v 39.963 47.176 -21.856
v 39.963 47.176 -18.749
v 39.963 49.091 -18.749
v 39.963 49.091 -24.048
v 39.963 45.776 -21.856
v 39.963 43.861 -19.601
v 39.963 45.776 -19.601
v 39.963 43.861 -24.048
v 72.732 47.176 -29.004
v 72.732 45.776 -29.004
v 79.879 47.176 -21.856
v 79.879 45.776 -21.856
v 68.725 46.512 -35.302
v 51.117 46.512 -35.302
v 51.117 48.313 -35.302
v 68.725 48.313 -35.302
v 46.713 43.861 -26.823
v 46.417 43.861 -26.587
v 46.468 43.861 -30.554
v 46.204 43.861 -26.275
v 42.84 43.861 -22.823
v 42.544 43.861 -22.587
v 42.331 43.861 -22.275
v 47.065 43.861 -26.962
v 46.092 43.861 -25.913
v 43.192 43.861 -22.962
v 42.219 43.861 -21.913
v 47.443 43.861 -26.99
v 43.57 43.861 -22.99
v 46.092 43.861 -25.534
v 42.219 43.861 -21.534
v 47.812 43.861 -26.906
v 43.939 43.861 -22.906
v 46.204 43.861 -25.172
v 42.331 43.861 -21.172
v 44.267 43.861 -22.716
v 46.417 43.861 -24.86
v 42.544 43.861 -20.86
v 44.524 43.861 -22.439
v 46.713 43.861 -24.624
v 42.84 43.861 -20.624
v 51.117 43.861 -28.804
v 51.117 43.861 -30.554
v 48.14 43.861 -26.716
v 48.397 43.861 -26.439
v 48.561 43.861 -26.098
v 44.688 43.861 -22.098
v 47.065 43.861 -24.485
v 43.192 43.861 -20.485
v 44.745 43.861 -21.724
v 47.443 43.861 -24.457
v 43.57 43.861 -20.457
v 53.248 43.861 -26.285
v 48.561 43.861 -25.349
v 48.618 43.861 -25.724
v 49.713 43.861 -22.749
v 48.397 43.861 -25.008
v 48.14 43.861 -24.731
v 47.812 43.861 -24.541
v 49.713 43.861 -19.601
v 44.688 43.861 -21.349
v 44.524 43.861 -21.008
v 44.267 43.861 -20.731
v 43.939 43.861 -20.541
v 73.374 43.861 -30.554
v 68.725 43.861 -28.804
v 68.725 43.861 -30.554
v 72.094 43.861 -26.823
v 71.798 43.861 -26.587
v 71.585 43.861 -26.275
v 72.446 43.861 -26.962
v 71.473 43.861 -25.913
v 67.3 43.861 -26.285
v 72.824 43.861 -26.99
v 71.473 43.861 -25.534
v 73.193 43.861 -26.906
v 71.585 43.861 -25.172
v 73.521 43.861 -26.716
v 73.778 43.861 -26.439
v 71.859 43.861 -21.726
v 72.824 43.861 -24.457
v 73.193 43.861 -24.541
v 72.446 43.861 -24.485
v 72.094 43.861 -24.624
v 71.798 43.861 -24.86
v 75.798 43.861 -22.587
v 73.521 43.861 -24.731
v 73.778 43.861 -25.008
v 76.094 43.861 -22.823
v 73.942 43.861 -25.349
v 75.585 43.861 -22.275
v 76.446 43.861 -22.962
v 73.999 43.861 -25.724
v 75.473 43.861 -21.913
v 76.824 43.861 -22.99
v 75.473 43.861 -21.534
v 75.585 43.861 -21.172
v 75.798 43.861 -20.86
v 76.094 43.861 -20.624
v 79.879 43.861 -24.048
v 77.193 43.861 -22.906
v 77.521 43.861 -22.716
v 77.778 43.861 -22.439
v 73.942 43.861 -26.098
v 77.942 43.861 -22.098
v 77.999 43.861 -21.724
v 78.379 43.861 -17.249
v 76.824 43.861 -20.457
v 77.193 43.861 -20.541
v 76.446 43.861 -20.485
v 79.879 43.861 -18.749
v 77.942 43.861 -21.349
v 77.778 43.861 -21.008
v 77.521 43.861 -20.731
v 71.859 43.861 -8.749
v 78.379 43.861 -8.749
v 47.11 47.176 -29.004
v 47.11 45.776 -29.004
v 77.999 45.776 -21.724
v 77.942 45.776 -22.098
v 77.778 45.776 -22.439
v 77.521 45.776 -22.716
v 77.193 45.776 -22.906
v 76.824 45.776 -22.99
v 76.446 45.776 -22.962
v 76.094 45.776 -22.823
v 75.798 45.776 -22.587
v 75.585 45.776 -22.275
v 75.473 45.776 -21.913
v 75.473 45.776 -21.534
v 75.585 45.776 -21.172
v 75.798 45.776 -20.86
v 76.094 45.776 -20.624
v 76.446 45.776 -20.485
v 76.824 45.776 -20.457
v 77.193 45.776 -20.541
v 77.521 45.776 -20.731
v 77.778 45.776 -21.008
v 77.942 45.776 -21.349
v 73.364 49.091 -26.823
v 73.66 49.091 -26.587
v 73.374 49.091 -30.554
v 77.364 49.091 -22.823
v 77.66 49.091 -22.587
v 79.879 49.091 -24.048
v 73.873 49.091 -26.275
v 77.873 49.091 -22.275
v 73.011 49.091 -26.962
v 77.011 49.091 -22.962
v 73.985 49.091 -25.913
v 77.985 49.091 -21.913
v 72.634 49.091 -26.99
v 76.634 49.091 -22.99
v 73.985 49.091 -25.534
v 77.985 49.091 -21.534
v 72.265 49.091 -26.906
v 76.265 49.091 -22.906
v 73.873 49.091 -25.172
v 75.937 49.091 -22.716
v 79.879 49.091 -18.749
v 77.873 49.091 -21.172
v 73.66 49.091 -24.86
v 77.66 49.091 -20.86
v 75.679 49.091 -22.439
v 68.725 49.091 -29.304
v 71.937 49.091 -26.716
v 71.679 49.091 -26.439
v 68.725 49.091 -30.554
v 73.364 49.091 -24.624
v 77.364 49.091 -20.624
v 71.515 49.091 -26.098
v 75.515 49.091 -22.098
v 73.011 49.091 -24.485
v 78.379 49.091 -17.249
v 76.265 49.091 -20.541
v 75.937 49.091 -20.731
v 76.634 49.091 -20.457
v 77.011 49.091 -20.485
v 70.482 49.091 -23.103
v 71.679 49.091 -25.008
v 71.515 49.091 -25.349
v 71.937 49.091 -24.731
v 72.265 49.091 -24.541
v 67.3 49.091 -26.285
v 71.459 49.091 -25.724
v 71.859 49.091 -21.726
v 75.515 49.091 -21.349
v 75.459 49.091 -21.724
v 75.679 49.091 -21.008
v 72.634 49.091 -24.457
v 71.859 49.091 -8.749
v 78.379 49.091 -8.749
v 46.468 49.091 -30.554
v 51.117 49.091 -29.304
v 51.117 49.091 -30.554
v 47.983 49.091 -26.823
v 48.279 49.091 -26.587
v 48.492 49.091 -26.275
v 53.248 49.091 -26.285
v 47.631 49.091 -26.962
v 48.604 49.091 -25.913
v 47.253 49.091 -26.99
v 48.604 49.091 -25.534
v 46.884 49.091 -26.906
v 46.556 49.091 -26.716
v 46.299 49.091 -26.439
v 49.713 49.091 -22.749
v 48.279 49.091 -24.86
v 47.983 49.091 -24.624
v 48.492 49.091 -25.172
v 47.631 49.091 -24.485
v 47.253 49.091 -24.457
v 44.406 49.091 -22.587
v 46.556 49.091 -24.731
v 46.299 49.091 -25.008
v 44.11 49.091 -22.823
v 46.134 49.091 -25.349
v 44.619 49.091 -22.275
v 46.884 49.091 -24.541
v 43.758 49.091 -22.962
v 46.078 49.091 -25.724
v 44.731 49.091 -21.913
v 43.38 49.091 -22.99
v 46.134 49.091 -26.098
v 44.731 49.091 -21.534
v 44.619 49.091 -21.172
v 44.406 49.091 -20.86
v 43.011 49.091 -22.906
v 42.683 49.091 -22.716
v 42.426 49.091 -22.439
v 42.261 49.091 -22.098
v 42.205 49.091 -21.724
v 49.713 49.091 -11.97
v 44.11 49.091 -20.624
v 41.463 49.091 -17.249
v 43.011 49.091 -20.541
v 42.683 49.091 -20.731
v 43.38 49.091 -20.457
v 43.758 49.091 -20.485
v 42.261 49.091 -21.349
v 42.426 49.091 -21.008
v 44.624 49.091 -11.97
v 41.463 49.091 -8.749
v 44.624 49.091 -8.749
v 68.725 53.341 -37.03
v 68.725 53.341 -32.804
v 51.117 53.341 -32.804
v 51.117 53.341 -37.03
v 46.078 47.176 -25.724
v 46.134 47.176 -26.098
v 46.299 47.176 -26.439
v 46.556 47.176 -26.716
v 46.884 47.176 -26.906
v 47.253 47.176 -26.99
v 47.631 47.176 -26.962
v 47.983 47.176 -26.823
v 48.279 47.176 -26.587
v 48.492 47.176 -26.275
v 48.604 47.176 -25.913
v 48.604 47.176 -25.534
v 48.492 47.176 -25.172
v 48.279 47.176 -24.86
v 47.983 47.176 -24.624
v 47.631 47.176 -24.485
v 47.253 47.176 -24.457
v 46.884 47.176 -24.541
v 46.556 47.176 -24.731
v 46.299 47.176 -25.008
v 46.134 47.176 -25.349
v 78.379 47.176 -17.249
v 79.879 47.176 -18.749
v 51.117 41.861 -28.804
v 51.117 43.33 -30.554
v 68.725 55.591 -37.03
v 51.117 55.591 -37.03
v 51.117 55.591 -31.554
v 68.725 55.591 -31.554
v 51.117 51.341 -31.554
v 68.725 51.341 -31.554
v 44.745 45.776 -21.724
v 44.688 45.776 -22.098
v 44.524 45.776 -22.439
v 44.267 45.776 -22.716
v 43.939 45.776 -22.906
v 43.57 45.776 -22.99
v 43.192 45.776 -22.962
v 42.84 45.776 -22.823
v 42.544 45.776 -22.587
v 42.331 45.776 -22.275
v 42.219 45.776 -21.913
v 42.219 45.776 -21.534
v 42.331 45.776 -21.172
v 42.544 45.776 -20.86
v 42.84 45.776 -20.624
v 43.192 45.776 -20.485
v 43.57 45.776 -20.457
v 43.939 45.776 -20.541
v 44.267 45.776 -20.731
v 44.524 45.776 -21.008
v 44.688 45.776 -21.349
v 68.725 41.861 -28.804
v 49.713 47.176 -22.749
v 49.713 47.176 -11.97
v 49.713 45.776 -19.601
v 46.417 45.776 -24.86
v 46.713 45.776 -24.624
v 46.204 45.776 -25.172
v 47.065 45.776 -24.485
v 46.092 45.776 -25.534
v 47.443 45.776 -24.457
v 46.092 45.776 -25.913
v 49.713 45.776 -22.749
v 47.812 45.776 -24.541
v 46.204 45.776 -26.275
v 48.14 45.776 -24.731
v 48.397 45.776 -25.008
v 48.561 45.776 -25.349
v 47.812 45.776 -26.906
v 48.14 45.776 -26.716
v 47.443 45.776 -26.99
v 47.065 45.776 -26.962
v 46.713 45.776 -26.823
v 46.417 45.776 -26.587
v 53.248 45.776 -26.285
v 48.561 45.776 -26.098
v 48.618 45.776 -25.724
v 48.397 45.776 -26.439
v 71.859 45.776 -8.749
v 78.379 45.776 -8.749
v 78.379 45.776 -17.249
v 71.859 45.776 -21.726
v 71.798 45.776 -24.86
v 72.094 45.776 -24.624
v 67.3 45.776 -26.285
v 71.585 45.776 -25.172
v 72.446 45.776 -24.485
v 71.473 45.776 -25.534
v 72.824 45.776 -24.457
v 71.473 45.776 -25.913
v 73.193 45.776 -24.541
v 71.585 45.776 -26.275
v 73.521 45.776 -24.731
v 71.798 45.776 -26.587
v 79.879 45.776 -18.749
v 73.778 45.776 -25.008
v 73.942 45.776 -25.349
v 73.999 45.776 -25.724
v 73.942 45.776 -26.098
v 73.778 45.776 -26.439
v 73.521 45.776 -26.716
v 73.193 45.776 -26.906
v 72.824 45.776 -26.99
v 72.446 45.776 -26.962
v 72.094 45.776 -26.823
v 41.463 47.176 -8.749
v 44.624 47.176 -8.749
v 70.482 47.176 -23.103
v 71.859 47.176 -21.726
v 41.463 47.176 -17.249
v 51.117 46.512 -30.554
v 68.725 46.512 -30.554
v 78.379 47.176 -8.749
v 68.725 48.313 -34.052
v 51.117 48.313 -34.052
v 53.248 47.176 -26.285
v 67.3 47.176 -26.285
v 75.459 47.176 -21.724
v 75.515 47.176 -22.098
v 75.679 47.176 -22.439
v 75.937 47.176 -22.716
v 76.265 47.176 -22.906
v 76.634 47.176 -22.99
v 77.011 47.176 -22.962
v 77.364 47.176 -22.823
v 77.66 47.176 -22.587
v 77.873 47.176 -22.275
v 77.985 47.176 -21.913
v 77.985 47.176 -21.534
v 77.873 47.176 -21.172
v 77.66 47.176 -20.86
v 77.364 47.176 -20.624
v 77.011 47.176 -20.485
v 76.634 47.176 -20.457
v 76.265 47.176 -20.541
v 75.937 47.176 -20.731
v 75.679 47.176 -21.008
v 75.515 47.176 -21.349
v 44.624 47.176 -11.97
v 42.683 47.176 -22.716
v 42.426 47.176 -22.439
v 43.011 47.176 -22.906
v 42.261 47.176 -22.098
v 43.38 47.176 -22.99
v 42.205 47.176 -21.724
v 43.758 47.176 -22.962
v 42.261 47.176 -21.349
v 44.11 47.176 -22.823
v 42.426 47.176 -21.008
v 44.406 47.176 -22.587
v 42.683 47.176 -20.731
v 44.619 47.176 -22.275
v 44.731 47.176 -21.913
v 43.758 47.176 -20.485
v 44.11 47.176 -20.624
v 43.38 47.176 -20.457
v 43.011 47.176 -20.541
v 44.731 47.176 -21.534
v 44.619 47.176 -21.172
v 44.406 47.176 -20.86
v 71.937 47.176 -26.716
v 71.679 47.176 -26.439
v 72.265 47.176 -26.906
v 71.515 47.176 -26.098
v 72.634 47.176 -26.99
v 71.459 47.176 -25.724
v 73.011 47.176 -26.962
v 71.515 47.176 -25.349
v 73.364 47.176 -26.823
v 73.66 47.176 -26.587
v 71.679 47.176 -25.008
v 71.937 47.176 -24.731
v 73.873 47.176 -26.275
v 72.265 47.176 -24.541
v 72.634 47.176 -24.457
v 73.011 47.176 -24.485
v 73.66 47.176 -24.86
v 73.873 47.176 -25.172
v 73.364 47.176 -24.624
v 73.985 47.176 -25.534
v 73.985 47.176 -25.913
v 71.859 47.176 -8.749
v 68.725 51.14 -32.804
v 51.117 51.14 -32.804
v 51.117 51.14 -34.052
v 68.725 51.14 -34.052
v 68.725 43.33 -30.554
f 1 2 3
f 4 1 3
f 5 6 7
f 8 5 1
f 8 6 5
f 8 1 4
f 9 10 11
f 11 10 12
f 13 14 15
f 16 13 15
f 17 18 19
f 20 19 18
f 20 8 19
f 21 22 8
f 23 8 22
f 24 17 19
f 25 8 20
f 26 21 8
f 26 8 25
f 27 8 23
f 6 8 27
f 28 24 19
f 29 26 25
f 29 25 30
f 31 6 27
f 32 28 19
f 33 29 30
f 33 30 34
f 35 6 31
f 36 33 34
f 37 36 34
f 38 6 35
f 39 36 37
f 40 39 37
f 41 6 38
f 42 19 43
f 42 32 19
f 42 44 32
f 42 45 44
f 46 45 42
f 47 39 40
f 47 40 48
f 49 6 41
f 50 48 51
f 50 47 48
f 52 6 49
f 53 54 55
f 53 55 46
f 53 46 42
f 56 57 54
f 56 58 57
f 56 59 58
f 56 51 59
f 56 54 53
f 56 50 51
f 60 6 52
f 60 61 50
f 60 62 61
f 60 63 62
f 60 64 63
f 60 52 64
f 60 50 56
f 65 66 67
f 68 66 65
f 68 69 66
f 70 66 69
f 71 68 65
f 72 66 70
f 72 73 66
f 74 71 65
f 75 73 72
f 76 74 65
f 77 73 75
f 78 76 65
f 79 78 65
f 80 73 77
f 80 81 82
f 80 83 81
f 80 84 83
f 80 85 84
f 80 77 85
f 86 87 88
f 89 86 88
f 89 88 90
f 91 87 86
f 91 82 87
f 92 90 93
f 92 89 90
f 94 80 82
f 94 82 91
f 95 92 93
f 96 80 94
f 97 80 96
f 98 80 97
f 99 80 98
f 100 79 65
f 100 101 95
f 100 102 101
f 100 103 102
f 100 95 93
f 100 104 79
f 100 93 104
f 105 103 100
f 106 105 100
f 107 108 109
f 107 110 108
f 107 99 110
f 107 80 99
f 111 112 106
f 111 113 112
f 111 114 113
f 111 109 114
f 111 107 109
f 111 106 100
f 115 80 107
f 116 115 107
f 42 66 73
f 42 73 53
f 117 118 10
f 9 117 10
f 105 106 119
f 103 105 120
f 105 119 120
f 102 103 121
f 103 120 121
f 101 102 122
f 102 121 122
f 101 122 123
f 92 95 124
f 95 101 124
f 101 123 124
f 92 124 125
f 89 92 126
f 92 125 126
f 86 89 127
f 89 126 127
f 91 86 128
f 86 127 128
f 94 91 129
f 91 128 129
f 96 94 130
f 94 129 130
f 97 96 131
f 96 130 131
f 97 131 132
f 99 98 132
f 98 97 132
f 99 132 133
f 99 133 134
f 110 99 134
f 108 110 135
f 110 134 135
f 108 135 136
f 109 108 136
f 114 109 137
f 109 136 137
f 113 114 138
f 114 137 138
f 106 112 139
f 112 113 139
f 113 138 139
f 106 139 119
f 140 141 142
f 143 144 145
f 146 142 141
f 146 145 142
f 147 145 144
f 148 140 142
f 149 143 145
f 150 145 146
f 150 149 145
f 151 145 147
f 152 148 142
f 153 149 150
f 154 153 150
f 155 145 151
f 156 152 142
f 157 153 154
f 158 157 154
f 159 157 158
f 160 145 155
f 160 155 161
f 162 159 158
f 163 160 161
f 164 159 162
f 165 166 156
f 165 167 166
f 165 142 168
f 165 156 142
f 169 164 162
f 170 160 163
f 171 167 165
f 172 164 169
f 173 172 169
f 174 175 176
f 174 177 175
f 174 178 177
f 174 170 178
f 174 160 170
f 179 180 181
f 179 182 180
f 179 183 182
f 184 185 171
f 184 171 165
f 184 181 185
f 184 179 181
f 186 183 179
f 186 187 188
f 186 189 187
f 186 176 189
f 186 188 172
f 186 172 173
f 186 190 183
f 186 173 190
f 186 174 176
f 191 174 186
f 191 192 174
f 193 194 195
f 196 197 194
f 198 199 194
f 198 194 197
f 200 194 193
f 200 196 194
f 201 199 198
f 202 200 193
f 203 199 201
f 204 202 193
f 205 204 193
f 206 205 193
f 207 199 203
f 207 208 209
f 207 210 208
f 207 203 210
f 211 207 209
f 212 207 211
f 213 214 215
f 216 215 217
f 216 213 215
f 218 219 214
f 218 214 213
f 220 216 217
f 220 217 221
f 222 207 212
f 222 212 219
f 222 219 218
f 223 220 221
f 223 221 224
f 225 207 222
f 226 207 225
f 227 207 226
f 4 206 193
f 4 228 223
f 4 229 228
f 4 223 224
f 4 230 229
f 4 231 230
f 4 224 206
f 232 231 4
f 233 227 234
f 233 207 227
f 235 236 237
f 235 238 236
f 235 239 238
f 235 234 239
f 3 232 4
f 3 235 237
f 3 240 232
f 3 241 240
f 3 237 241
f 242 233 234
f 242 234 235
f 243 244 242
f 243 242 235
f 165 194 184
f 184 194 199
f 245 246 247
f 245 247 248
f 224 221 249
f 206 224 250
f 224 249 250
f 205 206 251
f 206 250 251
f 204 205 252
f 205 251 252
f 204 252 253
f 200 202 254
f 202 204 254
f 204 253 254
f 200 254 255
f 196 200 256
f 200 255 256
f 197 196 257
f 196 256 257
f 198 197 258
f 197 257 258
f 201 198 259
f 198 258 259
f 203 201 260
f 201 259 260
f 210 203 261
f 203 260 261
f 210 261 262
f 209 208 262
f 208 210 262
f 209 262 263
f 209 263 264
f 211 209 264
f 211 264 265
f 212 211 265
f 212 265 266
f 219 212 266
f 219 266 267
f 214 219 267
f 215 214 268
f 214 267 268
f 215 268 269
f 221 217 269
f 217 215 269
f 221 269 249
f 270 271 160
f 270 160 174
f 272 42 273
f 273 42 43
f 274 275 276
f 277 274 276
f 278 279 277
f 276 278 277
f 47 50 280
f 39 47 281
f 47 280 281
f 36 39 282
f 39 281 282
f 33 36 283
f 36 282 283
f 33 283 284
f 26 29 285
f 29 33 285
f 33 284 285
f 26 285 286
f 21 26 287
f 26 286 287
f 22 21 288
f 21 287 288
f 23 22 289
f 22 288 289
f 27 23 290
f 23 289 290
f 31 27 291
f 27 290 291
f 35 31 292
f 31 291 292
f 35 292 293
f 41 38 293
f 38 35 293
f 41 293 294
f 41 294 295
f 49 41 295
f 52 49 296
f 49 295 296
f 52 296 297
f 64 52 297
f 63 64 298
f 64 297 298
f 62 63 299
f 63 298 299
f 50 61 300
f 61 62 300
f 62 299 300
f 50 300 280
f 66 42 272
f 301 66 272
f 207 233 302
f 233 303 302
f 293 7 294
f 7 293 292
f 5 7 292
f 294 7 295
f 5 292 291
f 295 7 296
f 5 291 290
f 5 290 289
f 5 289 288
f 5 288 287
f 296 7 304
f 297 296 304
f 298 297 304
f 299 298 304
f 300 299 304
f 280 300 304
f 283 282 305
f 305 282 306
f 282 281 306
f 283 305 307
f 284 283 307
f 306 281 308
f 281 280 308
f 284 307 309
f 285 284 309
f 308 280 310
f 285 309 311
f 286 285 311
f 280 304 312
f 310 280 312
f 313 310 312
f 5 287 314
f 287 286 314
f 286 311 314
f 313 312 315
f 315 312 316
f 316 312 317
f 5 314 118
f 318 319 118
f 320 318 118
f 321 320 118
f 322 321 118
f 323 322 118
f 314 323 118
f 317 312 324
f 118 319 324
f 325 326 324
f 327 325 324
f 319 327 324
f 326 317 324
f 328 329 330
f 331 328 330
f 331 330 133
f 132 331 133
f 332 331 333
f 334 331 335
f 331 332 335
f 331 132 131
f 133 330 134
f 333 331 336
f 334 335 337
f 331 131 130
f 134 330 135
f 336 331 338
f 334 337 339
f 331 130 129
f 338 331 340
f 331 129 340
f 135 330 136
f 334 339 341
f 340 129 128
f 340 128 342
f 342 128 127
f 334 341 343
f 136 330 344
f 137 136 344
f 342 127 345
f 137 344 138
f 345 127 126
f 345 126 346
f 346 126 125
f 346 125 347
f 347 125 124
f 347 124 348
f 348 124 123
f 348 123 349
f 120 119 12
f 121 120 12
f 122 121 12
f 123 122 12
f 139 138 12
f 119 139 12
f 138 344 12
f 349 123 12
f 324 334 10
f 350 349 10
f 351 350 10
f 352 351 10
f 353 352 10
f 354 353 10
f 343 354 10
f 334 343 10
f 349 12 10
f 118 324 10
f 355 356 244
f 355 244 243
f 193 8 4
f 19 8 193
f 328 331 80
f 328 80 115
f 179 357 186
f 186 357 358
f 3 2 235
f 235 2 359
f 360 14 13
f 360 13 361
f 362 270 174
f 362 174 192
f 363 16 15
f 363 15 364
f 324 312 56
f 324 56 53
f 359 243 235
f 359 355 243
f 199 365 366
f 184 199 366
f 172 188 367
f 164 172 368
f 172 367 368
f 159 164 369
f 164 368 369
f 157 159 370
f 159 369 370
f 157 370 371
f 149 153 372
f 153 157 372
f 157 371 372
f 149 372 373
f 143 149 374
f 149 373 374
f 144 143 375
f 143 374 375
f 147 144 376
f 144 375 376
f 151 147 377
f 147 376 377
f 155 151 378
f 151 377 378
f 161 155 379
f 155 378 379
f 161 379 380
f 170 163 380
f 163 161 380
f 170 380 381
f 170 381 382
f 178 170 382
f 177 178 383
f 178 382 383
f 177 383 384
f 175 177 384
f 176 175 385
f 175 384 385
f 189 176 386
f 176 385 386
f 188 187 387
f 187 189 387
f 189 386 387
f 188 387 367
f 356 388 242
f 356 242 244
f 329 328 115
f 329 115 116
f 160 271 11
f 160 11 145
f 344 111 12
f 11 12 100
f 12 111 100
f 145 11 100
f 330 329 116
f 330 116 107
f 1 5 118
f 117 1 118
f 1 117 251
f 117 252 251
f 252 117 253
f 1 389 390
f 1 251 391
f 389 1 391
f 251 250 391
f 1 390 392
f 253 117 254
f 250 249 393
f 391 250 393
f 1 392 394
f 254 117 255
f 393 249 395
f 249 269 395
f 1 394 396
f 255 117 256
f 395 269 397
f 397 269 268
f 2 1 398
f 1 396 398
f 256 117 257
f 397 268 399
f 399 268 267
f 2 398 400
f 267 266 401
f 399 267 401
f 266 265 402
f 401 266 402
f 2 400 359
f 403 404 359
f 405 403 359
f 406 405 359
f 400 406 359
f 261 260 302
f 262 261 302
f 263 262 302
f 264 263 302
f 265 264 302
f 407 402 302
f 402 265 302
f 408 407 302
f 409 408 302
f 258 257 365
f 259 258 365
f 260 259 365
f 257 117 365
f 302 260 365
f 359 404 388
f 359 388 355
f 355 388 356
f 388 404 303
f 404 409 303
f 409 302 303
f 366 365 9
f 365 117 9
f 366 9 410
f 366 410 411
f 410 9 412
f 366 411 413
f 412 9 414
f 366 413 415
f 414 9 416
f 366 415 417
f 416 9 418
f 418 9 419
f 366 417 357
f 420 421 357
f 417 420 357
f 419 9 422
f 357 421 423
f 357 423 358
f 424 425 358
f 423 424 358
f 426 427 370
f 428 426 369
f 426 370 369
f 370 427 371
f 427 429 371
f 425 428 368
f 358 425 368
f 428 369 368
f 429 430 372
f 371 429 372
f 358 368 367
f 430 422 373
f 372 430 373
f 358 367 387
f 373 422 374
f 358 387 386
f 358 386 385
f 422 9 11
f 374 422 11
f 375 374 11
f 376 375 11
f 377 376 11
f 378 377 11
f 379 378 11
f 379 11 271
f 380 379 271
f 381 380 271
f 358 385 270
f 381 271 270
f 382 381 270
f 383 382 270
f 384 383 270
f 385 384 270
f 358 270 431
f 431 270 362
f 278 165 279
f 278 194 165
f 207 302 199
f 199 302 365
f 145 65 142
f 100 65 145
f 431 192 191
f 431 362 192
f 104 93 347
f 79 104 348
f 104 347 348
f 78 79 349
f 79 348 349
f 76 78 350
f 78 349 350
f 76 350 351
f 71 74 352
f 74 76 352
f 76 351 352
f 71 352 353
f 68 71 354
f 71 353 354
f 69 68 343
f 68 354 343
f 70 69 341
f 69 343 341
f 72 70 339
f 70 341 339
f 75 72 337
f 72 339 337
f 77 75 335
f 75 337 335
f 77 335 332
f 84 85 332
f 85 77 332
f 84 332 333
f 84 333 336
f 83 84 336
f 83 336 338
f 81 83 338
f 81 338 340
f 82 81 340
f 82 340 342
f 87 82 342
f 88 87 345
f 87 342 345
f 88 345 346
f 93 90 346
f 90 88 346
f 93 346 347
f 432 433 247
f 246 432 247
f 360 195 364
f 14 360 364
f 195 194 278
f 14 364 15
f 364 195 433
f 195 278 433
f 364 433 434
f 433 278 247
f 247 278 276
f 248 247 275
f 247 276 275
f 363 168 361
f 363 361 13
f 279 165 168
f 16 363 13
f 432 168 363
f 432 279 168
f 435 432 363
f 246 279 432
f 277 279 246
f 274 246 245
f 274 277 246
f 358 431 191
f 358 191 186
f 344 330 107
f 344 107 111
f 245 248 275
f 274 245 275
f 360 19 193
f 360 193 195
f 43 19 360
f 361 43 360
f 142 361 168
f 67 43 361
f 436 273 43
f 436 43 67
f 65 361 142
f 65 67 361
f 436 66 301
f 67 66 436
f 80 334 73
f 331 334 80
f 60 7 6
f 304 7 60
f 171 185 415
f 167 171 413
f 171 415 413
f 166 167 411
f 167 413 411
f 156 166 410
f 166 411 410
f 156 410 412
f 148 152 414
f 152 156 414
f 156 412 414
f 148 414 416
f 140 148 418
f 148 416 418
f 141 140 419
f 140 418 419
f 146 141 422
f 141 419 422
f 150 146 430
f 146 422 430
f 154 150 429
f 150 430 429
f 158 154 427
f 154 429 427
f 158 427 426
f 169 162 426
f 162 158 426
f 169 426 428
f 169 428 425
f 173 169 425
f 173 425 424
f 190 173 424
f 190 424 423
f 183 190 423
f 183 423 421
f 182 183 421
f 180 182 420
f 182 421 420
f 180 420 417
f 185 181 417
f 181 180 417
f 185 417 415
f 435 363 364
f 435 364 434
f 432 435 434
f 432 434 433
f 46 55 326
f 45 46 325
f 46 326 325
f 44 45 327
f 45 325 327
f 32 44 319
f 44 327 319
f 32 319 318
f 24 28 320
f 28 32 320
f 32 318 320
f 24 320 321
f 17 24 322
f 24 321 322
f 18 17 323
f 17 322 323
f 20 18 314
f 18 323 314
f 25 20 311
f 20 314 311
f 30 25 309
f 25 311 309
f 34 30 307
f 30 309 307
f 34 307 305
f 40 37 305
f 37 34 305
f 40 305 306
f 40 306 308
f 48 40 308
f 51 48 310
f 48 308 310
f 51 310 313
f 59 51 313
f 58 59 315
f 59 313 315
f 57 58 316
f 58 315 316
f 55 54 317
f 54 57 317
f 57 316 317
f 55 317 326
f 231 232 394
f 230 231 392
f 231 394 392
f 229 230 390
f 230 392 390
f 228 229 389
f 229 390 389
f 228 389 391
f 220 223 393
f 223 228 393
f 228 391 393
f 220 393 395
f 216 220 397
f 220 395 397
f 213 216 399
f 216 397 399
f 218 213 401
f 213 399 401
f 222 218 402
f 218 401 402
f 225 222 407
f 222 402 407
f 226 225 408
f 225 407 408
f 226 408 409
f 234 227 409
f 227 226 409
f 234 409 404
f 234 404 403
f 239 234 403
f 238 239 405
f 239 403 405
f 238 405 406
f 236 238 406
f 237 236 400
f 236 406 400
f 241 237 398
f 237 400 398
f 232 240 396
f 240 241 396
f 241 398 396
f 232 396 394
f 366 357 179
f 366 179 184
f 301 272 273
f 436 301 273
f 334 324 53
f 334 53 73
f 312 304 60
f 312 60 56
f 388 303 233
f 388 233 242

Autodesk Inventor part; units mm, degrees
ref_plane "Work Plane1" through (59.9208, 47.0911, 21.911) normal (0, 1, 0) x (-1, 0, 0)
sketch "Sketch1" plane through (59.9208, 47.0911, 21.911) normal (0, 1, 0) x (-1, 0, 0)
  circle A0 centre (-16.808, -43.6345) radius 1.27
  circle A1 centre (12.5729, -47.6345) radius 1.27
  circle A2 centre (16.4459, -43.6345) radius 1.27
  circle A3 centre (-12.808, -47.6345) radius 1.27
  line L0 (10.208, -33.8805) -> (10.208, -44.6601)
  line L1 (10.208, -44.6601) -> (6.6725, -48.1956)
  circle A4 centre (-16.808, -43.6345) radius 1.27 projected
  circle A5 centre (12.5729, -47.6345) radius 1.27 projected
  circle A6 centre (16.4459, -43.6345) radius 1.27 projected
  circle A7 centre (-12.8081, -47.6345) radius 1.27 projected
  line L2 (19.708, -15.6655) -> (-19.708, -15.6655)
  line L3 (0, -15.6655) -> (0, -20.8781)
  line L4 (6.6725, -48.1956) -> (-7.3796, -48.1956)
  line L5 (-19.958, -43.8381) -> (-12.8316, -50.9645)
  line L6 (-12.8316, -50.9645) -> (12.8316, -50.9645)
  line L7 (-19.958, -40.6601) -> (-19.958, -43.8381)
  line L8 (0, -48.1956) -> (0, -46.7038)
  line L9 (19.958, -43.8381) -> (12.8316, -50.9645)
  line L10 (19.958, -40.6601) -> (19.958, -43.8381)
  line L11 (-11.938, -30.6601) -> (-11.938, -43.6372)
  line L12 (-10.5616, -45.0137) -> (-11.938, -43.6372)
  line L13 (-10.5616, -45.0137) -> (-7.3796, -48.1956)
  line L14 (15.2967, -30.6601) -> (18.458, -30.6601)
  line L15 (18.458, -30.6601) -> (18.458, -39.1601)
  line L16 (-18.458, -39.1601) -> (-18.458, -30.6601)
  line L17 (-18.458, -30.6601) -> (-11.938, -30.6601)
  line L18 (10.208, -33.8805) -> (15.2967, -33.8805)
  line L19 (15.2967, -33.8805) -> (15.2967, -30.6601)
  line L20 (-19.958, -40.6601) -> (-18.458, -39.1601)
  line L21 (19.958, -40.6601) -> (18.458, -39.1601)
  point P0 (-19.708, -43.6601)
  point P1 (-6.6725, -48.1956)
  dimension "d14" = 5
  dimension "d15" = 135
  dimension "d18" = 2.54
extrude "Extrusion1" add sketch "Sketch1" along normal blind 2
ref_plane "Work Plane2" through (59.9208, 45.8611, 21.911) normal (0, -1, 0) x (1, 0, 0)
sketch "Sketch2" plane through (59.9208, 45.8611, 21.911) normal (0, -1, 0) x (1, 0, 0)
  line L0 (-10.208, -33.8805) -> (-10.208, -44.6601) projected
  line L1 (-10.208, -44.6601) -> (-6.6725, -48.1956) projected
  line L2 (-6.6725, -48.1956) -> (7.3796, -48.1956) projected
  circle A0 centre (16.808, -43.6345) radius 1.27 projected
  circle A1 centre (-12.5729, -47.6345) radius 1.27 projected
  circle A2 centre (-16.4459, -43.6345) radius 1.27 projected
  circle A3 centre (12.808, -47.6345) radius 1.27 projected
  line L3 (19.958, -40.6601) -> (19.958, -43.8381) projected
  line L4 (19.958, -43.8381) -> (12.8316, -50.9645) projected
  line L5 (12.8316, -50.9645) -> (-12.8316, -50.9645) projected
  line L6 (-12.8316, -50.9645) -> (-19.958, -43.8381) projected
  line L7 (-19.958, -43.8381) -> (-19.958, -40.6601) projected
  line L8 (7.3796, -48.1956) -> (11.938, -43.6372) projected
  line L9 (11.938, -43.6372) -> (11.938, -30.6601) projected
  line L10 (11.938, -30.6601) -> (18.458, -30.6601) projected
  line L11 (18.458, -30.6601) -> (18.458, -39.1601) projected
  line L12 (-18.458, -39.1601) -> (-18.458, -30.6601) projected
  line L13 (-18.458, -30.6601) -> (-15.2967, -30.6601) projected
  line L14 (-15.2967, -30.6601) -> (-15.2967, -33.8805) projected
  line L15 (-15.2967, -33.8805) -> (-10.208, -33.8805) projected
  line L16 (18.458, -39.1601) -> (19.958, -40.6601) projected
  line L17 (-19.958, -40.6601) -> (-18.458, -39.1601) projected
  circle A4 centre (-16.4459, -43.6345) radius 1.27 projected
  line L18 (-19.958, -43.8381) -> (-19.958, -40.6601) projected
  line L19 (-19.958, -41.5123) -> (-10.208, -41.5123)
  line L20 (-10.208, -33.8805) -> (-10.208, -44.6601) projected
  point P0 (-59.9208, -21.911)
extrude "Extrusion2" add sketch "Sketch2" along normal blind 2 contours L0 L1 L2 L8 L9 L10 L11 L16 L3 L4 L5 L6 L7 L19
sketch "Sketch4" plane through (79.8789, 45.8611, -18.7491) normal (1, 0, 0) x (0, 0, -1)
  line L0 (0, 1.23) -> (3.178, 1.23) projected
  line L1 (0, 0) -> (-1.5, 0) projected
  line L2 (0, 1.23) -> (0, 0)
  line L3 (-12.1065, -0.085) -> (12.1065, -0.085)
  line L4 (12.1065, -0.085) -> (12.1065, 1.315)
  line L5 (12.1065, 1.315) -> (-12.1065, 1.315)
  line L6 (-12.1065, 1.315) -> (-12.1065, -0.085)
  line L7 (-12.1065, -0.085) -> (12.1065, 1.315) construction
  line L8 (12.1065, -0.085) -> (-12.1065, 1.315) construction
  point P0 (0, 0.615)
  dimension "d73" = 1.4
extrude "Extrusion3" cut sketch "Sketch4" against normal through all
sketch "Sketch5" plane through (59.9208, 43.8611, 21.911) normal (0, -1, 0) x (1, 0, 0)
  line L0 (-19.708, -43.6601) -> (-19.708, -40.6601)
  line L1 (-12.6424, -50.7145) -> (-19.708, -43.6601)
  line L2 (12.728, -50.7145) -> (-12.6424, -50.7145)
  line L3 (19.708, -43.7345) -> (12.728, -50.7145)
  line L4 (-13.4529, -52.4645) -> (13.4529, -52.4645)
  line L5 (19.708, -43.7345) -> (19.708, -40.6601)
  line L6 (-12.8316, -50.9145) -> (12.8316, -50.9145)
  line L7 (12.8316, -50.9645) -> (11.3316, -52.4645)
  line L8 (-19.958, -43.8381) -> (-12.8316, -50.9645)
  line L9 (-12.8316, -50.9645) -> (-11.3316, -52.4645)
  line L10 (-12.8316, -50.9645) -> (-10.7103, -50.9645) construction
  line L11 (12.8316, -50.9145) -> (12.8816, -50.9145)
  line L12 (-12.8316, -50.9645) -> (12.8316, -50.9645)
  line L13 (12.8316, -50.9645) -> (12.8816, -50.9145)
  line L14 (12.8316, -50.9645) -> (19.958, -43.8381)
  line L15 (-12.8316, -50.9145) -> (-12.8816, -50.9145)
  line L16 (-12.8316, -50.9645) -> (-12.8816, -50.9145)
  line L17 (12.8109, -50.9145) -> (19.958, -43.7673)
  line L18 (-19.958, -43.7673) -> (-12.8109, -50.9145)
  line L19 (-19.958, -45.9594) -> (-13.4529, -52.4645)
  line L20 (13.4529, -52.4645) -> (19.958, -45.9594)
  line L21 (-19.958, -43.7673) -> (-19.958, -45.9594)
  line L22 (12.8316, -50.9645) -> (19.958, -43.8381) projected
  line L23 (19.958, -43.8381) -> (19.958, -45.9594)
  line L24 (19.958, -43.8381) -> (19.958, -43.7673)
  line L25 (19.958, -43.8381) -> (19.958, -40.6601) projected
  dimension "d29" = 0.2
  dimension "d62" = 45
  dimension "d74" = 0.05
  dimension "d75" = 0.05
  dimension "d76" = 1.5
  dimension "d77" = 1.5
extrude "Extrusion4" add sketch "Sketch5" against normal up to surface (5.23 mm away)
ref_plane "Work Plane13" through (59.9208, 43.8611, -18.7491) normal (1, 0, 0) x (0, 0, -1)
ref_plane "Work Plane14" through (53.2483, 46.4761, -26.2847) normal (0, 1, 0) x (1, 0, 0)
sketch "Sketch18" plane through (59.9208, 43.8611, -18.7491) normal (1, 0, 0) x (0, 0, -1)
  line L0 (12.8044, 2.651) -> (16.5534, 2.651)
  line L1 (16.5534, 2.651) -> (16.5534, 4.4515)
  line L2 (16.5534, 4.4515) -> (15.3033, 4.4515)
  line L3 (15.3033, 4.4515) -> (15.3033, 7.2794)
  line L4 (15.3033, 7.2794) -> (14.0544, 7.2794)
  line L5 (14.0544, 7.2794) -> (14.0544, 9.48)
  line L6 (14.0544, 9.48) -> (18.2804, 9.48)
  line L7 (18.2804, 9.48) -> (18.2804, 11.73)
  line L8 (18.2804, 11.73) -> (12.8044, 11.73)
  line L9 (12.8044, 7.48) -> (12.8044, 11.73)
  line L10 (12.8044, 2.651) -> (11.8044, 2.651)
  line L11 (11.8044, 0) -> (10.0544, 0)
  line L12 (10.0544, 0) -> (10.0544, -2)
  line L13 (10.0544, -2) -> (11.8044, -0.5316)
  line L14 (11.8044, -0.5316) -> (11.8044, 0)
  line L15 (11.8044, 0) -> (11.8044, 5.23) projected
  line L16 (11.8044, 2.651) -> (11.8044, 5.23)
  line L17 (10.5544, 5.23) -> (12.8044, 7.48)
  line L18 (10.5544, 5.23) -> (11.8044, 5.23)
  point P0 (12.8044, 6.23)
  dimension "d184" = 1.75
  dimension "d185" = 2
  dimension "d186" = 50
extrude "Extrusion12" add sketch "Sketch18" along normal blind 8.804 and the other way blind 8.804
ref_plane "Work Plane19" through (51.1168, 53.1911, -37.0296) normal (0, -1, 0) x (1, 0, 0)
ref_plane "Work Plane20" through (68.7248, 51.1406, -34.2524) normal (0, 0, -1) x (-1, 0, 0)
properties part number "Button Holder"
